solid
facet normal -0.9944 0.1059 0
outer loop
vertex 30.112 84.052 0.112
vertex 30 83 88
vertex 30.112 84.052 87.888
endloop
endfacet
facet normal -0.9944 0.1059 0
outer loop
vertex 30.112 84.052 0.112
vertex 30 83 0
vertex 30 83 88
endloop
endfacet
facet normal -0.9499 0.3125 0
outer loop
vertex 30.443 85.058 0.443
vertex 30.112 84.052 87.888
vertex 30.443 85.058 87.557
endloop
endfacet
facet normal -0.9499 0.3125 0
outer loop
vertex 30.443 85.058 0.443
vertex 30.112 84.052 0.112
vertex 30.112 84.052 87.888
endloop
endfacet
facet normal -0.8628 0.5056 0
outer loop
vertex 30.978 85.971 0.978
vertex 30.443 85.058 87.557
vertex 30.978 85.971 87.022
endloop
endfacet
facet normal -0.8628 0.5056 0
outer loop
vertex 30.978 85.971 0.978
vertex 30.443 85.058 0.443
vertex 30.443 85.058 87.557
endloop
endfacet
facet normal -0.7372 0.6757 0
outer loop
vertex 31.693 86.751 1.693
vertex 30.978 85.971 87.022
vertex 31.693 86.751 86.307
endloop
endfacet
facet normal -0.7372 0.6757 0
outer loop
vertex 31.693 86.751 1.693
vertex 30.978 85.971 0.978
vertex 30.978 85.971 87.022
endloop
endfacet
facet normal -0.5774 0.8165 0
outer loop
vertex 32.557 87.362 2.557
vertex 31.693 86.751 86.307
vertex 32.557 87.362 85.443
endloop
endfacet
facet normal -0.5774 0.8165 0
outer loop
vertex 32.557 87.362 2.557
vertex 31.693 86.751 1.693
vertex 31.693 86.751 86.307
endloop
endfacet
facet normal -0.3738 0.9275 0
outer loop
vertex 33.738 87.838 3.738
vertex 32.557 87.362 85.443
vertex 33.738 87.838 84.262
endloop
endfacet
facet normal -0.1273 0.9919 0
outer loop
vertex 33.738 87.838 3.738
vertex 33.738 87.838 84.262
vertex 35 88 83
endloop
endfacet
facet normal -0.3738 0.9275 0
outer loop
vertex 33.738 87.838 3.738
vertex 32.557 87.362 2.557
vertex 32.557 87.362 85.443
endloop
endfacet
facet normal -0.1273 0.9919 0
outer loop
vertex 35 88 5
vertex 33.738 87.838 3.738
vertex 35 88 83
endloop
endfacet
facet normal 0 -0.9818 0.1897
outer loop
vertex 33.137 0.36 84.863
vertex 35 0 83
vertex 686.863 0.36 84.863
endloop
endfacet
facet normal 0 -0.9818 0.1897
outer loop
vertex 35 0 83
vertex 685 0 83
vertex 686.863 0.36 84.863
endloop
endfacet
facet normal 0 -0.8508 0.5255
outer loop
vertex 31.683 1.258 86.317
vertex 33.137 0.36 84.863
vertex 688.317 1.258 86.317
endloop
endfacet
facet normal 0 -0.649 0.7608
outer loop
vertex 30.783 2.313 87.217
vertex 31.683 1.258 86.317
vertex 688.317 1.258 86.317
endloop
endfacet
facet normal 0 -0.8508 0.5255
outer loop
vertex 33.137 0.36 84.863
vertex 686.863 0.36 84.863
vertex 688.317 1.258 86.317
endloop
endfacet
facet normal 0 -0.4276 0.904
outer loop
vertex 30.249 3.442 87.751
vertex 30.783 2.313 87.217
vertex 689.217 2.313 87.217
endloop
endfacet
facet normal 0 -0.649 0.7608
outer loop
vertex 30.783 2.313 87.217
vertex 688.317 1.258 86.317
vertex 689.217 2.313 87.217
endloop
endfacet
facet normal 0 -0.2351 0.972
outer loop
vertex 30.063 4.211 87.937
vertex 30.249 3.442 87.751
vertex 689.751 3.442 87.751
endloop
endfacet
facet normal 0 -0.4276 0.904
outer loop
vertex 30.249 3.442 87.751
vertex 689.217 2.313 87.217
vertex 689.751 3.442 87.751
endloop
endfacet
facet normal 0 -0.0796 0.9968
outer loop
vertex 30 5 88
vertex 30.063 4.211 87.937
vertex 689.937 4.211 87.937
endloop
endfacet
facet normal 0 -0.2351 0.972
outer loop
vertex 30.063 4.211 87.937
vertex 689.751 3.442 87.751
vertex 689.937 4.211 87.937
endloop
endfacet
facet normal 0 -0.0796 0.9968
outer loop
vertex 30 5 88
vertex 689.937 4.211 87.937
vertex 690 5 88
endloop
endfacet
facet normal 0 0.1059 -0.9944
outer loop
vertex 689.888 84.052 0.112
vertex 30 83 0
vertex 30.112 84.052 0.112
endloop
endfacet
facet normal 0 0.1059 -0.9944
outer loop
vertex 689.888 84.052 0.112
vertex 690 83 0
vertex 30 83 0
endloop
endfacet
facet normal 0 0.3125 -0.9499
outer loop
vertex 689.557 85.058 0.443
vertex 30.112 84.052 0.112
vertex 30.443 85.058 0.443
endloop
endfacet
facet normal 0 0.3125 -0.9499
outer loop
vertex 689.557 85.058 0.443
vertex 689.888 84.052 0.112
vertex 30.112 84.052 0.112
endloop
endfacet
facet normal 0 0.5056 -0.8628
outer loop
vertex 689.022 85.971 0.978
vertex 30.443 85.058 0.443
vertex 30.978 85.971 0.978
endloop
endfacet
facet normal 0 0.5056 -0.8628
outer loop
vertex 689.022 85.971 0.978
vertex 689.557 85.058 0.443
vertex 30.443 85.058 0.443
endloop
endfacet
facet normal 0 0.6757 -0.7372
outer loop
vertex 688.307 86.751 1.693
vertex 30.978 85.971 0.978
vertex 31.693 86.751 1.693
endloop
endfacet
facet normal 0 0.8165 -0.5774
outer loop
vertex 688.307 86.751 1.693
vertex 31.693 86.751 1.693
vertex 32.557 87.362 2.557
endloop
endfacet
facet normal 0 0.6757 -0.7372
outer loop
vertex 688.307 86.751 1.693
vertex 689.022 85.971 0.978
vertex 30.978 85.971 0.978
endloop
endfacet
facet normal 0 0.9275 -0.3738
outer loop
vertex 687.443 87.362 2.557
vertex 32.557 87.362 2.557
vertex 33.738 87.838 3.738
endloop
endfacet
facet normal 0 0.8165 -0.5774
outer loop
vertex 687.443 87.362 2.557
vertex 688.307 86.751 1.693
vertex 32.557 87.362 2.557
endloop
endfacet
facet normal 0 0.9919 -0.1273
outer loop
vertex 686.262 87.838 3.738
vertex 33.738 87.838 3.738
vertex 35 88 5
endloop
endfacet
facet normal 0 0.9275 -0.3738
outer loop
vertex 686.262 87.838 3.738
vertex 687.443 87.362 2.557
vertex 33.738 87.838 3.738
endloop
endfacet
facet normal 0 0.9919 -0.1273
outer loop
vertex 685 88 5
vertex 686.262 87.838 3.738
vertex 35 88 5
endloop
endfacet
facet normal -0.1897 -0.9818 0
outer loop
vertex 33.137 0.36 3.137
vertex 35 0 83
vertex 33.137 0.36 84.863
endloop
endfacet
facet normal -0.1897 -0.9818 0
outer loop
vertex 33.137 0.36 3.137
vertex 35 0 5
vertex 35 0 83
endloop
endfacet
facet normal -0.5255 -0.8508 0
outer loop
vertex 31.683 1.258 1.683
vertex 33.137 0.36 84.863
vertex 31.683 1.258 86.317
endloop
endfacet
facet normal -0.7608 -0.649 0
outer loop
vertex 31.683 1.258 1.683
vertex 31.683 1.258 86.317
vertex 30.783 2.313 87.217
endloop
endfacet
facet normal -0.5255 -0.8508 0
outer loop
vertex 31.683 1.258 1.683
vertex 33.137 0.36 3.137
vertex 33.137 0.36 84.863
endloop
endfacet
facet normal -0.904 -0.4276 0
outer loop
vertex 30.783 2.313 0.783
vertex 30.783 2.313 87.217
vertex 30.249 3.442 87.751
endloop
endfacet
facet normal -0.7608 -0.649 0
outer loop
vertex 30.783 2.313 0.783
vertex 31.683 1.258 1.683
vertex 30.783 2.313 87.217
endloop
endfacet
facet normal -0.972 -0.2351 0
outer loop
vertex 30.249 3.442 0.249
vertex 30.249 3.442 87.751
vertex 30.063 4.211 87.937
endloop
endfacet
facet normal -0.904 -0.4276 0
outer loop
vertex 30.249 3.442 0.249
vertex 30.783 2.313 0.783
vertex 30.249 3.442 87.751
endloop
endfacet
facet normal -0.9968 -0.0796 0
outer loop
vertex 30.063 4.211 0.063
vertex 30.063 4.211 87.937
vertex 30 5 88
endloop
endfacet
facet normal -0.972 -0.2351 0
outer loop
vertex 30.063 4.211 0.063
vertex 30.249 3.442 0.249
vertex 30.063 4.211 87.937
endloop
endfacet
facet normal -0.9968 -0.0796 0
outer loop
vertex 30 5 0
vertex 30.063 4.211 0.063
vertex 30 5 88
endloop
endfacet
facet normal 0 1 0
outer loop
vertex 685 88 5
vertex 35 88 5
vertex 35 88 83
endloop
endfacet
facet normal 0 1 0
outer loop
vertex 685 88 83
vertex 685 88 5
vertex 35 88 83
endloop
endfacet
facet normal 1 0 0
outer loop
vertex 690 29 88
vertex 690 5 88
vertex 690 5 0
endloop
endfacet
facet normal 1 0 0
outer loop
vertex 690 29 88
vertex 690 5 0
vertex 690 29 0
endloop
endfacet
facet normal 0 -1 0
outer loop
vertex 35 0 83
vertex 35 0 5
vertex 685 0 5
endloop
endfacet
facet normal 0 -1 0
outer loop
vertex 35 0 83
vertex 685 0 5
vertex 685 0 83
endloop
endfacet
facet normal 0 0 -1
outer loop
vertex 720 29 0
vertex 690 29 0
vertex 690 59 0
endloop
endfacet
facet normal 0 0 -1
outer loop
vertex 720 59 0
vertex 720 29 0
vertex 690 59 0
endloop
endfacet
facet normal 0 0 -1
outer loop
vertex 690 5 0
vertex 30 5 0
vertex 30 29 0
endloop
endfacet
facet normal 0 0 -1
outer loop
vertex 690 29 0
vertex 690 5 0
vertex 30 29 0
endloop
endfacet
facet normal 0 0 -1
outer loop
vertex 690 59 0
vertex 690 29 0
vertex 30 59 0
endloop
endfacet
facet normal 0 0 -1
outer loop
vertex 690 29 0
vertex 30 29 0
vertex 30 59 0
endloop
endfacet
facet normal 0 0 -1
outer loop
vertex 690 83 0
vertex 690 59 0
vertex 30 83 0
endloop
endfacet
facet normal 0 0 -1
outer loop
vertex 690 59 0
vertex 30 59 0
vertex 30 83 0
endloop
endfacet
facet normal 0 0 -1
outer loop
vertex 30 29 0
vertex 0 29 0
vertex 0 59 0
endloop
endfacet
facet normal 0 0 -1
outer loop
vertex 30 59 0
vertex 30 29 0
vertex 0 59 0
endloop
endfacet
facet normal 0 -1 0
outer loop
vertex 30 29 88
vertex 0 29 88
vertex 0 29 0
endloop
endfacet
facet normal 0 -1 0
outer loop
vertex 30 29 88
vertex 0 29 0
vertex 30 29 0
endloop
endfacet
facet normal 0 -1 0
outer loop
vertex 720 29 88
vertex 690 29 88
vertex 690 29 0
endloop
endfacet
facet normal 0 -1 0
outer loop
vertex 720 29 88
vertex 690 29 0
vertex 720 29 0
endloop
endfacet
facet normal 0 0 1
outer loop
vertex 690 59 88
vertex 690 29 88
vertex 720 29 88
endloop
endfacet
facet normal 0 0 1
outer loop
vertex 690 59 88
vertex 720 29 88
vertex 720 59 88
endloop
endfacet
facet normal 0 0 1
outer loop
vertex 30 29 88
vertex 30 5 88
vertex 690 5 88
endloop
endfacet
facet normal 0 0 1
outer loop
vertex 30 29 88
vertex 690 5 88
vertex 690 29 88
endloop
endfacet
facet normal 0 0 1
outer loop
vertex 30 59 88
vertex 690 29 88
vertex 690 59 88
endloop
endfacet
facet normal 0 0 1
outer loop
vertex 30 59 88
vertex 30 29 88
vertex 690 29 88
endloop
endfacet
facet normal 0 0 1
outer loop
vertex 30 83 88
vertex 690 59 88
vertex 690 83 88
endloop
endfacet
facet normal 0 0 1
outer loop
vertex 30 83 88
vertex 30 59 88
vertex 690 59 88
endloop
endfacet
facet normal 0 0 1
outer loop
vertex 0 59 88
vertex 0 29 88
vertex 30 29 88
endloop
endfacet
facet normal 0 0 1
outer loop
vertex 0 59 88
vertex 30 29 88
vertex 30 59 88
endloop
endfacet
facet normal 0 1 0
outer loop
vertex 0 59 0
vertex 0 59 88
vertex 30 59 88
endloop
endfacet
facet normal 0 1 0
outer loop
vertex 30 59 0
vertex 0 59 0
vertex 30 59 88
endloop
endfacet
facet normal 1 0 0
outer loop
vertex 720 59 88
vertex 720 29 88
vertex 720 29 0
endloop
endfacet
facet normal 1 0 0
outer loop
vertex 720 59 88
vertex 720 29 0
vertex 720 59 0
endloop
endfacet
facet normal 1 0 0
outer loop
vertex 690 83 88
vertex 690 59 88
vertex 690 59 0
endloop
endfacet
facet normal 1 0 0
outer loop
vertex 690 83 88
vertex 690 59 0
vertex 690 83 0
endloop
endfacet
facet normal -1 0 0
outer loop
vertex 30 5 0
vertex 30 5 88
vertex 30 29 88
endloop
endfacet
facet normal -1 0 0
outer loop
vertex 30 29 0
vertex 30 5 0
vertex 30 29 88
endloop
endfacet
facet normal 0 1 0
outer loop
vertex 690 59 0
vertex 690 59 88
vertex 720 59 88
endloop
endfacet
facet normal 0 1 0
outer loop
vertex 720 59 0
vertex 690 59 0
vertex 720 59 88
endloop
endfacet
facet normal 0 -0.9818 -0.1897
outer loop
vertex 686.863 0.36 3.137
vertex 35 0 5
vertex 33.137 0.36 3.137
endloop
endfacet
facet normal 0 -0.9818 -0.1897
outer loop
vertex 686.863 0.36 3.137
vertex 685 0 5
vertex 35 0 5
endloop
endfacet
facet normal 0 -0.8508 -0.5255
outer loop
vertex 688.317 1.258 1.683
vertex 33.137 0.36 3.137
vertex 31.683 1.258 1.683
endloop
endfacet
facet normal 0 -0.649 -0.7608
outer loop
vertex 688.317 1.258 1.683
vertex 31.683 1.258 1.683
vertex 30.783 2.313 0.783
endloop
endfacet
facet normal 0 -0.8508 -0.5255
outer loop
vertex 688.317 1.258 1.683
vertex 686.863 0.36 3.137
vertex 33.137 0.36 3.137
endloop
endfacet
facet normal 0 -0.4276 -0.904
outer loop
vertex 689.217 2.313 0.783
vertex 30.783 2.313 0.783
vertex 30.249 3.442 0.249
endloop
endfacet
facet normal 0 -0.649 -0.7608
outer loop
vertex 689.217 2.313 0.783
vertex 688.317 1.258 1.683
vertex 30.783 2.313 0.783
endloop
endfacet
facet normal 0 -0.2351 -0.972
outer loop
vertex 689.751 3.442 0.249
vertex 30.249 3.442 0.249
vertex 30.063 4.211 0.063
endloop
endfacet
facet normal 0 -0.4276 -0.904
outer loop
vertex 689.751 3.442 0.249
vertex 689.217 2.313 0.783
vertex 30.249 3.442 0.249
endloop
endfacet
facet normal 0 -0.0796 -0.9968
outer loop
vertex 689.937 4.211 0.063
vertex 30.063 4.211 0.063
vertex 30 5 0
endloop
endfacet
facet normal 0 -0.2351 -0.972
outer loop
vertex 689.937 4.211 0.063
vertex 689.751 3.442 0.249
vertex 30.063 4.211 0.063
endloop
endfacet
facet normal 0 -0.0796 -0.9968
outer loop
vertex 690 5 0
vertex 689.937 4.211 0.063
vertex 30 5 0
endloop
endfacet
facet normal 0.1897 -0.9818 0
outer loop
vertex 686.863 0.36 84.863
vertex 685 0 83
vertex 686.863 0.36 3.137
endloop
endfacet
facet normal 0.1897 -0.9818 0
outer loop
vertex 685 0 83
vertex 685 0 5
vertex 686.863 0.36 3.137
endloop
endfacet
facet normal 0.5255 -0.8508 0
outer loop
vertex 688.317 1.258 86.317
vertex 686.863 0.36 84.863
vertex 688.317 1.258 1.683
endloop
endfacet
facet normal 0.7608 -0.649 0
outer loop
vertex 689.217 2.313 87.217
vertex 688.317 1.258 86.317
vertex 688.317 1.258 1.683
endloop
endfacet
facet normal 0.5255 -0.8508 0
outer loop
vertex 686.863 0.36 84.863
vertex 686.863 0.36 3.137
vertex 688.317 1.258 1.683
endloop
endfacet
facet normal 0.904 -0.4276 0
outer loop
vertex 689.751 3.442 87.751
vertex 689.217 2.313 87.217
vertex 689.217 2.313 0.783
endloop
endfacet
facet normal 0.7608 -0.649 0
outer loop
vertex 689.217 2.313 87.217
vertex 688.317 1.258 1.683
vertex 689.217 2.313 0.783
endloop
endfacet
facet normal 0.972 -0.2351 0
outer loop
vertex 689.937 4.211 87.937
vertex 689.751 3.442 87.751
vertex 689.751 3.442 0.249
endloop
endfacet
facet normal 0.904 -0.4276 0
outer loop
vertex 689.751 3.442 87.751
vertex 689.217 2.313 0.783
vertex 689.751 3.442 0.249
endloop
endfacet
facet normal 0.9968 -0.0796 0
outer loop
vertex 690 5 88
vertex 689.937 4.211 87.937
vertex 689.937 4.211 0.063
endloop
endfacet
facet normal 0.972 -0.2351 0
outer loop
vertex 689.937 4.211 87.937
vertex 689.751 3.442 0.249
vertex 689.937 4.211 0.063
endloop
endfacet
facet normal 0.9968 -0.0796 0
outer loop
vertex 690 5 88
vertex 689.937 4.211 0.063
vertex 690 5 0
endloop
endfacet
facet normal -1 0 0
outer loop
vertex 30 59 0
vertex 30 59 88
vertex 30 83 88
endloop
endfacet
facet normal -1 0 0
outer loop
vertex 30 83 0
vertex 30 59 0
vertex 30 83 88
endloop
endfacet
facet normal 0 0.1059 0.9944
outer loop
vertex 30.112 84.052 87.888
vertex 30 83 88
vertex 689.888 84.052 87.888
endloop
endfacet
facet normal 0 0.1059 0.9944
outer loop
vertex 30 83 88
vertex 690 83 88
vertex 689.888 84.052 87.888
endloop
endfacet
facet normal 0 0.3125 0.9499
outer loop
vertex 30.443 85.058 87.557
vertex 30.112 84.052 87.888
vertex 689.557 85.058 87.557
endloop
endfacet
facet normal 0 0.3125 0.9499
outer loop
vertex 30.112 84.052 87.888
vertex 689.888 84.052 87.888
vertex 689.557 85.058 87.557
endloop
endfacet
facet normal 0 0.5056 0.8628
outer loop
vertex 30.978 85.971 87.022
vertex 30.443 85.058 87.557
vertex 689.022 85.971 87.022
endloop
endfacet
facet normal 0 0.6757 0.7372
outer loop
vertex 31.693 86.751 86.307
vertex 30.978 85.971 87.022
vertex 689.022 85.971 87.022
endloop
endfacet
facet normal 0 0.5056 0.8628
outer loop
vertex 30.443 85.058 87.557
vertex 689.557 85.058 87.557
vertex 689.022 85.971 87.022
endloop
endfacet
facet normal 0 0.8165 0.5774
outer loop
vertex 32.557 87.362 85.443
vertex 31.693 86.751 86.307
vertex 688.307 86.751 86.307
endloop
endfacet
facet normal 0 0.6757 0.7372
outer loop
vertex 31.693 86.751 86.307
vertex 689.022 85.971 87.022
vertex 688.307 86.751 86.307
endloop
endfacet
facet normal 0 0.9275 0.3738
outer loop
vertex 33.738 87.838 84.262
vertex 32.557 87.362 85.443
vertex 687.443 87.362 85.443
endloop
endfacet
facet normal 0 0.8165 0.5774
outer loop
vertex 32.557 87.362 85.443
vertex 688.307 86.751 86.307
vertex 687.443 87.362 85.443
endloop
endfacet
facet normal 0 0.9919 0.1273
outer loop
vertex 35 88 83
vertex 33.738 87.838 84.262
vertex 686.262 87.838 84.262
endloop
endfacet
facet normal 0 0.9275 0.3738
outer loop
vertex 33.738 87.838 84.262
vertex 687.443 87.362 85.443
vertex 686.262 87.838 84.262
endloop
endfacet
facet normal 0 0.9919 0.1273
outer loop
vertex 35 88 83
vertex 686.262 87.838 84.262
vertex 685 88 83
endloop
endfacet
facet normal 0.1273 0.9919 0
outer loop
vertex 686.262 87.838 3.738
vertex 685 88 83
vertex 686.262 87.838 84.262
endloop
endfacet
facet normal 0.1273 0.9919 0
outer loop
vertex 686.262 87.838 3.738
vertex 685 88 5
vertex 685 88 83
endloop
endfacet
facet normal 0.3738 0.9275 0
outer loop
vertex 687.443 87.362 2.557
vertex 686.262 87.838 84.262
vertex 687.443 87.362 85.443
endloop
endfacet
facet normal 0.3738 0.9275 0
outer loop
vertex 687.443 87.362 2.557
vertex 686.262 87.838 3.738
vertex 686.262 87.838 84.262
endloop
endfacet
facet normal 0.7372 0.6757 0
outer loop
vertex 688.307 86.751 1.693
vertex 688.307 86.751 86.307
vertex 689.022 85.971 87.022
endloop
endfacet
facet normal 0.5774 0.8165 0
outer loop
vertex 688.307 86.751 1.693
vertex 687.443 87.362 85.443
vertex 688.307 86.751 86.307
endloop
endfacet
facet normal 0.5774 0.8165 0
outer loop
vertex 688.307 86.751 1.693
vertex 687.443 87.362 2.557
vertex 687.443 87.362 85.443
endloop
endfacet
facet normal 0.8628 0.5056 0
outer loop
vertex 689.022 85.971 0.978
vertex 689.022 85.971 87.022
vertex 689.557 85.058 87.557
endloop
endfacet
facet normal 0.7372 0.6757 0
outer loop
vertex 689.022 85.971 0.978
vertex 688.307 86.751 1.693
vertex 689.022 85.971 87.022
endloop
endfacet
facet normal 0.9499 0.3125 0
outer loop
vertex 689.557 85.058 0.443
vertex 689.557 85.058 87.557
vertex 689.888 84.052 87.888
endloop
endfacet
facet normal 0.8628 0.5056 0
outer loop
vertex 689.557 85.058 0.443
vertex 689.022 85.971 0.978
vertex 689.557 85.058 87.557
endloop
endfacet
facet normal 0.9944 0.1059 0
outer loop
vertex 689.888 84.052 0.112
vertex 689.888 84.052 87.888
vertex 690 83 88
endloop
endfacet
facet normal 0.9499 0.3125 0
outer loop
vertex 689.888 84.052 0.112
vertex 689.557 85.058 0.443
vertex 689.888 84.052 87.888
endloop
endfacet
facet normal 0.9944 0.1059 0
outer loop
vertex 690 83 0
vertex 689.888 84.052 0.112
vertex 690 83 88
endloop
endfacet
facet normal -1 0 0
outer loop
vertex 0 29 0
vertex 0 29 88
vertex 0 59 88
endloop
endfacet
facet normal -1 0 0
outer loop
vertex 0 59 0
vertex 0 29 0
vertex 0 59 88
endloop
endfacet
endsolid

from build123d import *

# Parameters (mm, degrees)
F0_W     = 88
F0_H     = 88
F1_DEPTH = 720
F2_W     = 30
F2_H     = 29
F3_DEPTH = 88.001
F4_W     = 30
F4_H     = 29
F5_DEPTH = 88.001
F6_R     = 5


with BuildPart() as f1:
    # F0 (on Right) → F1 (new body)
    with BuildSketch(Plane.YZ):
        with Locations((44, 44)):
            Rectangle(F0_W, F0_H)
    extrude(amount=F1_DEPTH)

    # F2 (on face) → F3 (cut, through all)
    with BuildSketch(Plane.XY.offset(88)):
        with Locations((705, 14.5)):
            Rectangle(F2_W, F2_H)
        with Locations((705, 73.5)):
            Rectangle(F2_W, F2_H)
    extrude(amount=-F3_DEPTH, mode=Mode.SUBTRACT)

    # F4 (on face) → F5 (cut, through all)
    with BuildSketch(Plane.XY.offset(88)):
        with Locations((15, 73.5)):
            Rectangle(F4_W, F4_H)
        with Locations((15, 14.5)):
            Rectangle(F4_W, F4_H)
    extrude(amount=-F5_DEPTH, mode=Mode.SUBTRACT)

    # F6
    f6_edges = [f1.edges().sort_by_distance(p)[0] for p in [
        (30, 0, 44),
        (360, 0, 0),
        (690, 0, 44),
        (360, 0, 88),
        (360, 88, 88),
        (360, 88, 0),
        (690, 88, 44),
        (30, 88, 44),
    ]]
    fillet(f6_edges, radius=F6_R)


solid = f1.part
